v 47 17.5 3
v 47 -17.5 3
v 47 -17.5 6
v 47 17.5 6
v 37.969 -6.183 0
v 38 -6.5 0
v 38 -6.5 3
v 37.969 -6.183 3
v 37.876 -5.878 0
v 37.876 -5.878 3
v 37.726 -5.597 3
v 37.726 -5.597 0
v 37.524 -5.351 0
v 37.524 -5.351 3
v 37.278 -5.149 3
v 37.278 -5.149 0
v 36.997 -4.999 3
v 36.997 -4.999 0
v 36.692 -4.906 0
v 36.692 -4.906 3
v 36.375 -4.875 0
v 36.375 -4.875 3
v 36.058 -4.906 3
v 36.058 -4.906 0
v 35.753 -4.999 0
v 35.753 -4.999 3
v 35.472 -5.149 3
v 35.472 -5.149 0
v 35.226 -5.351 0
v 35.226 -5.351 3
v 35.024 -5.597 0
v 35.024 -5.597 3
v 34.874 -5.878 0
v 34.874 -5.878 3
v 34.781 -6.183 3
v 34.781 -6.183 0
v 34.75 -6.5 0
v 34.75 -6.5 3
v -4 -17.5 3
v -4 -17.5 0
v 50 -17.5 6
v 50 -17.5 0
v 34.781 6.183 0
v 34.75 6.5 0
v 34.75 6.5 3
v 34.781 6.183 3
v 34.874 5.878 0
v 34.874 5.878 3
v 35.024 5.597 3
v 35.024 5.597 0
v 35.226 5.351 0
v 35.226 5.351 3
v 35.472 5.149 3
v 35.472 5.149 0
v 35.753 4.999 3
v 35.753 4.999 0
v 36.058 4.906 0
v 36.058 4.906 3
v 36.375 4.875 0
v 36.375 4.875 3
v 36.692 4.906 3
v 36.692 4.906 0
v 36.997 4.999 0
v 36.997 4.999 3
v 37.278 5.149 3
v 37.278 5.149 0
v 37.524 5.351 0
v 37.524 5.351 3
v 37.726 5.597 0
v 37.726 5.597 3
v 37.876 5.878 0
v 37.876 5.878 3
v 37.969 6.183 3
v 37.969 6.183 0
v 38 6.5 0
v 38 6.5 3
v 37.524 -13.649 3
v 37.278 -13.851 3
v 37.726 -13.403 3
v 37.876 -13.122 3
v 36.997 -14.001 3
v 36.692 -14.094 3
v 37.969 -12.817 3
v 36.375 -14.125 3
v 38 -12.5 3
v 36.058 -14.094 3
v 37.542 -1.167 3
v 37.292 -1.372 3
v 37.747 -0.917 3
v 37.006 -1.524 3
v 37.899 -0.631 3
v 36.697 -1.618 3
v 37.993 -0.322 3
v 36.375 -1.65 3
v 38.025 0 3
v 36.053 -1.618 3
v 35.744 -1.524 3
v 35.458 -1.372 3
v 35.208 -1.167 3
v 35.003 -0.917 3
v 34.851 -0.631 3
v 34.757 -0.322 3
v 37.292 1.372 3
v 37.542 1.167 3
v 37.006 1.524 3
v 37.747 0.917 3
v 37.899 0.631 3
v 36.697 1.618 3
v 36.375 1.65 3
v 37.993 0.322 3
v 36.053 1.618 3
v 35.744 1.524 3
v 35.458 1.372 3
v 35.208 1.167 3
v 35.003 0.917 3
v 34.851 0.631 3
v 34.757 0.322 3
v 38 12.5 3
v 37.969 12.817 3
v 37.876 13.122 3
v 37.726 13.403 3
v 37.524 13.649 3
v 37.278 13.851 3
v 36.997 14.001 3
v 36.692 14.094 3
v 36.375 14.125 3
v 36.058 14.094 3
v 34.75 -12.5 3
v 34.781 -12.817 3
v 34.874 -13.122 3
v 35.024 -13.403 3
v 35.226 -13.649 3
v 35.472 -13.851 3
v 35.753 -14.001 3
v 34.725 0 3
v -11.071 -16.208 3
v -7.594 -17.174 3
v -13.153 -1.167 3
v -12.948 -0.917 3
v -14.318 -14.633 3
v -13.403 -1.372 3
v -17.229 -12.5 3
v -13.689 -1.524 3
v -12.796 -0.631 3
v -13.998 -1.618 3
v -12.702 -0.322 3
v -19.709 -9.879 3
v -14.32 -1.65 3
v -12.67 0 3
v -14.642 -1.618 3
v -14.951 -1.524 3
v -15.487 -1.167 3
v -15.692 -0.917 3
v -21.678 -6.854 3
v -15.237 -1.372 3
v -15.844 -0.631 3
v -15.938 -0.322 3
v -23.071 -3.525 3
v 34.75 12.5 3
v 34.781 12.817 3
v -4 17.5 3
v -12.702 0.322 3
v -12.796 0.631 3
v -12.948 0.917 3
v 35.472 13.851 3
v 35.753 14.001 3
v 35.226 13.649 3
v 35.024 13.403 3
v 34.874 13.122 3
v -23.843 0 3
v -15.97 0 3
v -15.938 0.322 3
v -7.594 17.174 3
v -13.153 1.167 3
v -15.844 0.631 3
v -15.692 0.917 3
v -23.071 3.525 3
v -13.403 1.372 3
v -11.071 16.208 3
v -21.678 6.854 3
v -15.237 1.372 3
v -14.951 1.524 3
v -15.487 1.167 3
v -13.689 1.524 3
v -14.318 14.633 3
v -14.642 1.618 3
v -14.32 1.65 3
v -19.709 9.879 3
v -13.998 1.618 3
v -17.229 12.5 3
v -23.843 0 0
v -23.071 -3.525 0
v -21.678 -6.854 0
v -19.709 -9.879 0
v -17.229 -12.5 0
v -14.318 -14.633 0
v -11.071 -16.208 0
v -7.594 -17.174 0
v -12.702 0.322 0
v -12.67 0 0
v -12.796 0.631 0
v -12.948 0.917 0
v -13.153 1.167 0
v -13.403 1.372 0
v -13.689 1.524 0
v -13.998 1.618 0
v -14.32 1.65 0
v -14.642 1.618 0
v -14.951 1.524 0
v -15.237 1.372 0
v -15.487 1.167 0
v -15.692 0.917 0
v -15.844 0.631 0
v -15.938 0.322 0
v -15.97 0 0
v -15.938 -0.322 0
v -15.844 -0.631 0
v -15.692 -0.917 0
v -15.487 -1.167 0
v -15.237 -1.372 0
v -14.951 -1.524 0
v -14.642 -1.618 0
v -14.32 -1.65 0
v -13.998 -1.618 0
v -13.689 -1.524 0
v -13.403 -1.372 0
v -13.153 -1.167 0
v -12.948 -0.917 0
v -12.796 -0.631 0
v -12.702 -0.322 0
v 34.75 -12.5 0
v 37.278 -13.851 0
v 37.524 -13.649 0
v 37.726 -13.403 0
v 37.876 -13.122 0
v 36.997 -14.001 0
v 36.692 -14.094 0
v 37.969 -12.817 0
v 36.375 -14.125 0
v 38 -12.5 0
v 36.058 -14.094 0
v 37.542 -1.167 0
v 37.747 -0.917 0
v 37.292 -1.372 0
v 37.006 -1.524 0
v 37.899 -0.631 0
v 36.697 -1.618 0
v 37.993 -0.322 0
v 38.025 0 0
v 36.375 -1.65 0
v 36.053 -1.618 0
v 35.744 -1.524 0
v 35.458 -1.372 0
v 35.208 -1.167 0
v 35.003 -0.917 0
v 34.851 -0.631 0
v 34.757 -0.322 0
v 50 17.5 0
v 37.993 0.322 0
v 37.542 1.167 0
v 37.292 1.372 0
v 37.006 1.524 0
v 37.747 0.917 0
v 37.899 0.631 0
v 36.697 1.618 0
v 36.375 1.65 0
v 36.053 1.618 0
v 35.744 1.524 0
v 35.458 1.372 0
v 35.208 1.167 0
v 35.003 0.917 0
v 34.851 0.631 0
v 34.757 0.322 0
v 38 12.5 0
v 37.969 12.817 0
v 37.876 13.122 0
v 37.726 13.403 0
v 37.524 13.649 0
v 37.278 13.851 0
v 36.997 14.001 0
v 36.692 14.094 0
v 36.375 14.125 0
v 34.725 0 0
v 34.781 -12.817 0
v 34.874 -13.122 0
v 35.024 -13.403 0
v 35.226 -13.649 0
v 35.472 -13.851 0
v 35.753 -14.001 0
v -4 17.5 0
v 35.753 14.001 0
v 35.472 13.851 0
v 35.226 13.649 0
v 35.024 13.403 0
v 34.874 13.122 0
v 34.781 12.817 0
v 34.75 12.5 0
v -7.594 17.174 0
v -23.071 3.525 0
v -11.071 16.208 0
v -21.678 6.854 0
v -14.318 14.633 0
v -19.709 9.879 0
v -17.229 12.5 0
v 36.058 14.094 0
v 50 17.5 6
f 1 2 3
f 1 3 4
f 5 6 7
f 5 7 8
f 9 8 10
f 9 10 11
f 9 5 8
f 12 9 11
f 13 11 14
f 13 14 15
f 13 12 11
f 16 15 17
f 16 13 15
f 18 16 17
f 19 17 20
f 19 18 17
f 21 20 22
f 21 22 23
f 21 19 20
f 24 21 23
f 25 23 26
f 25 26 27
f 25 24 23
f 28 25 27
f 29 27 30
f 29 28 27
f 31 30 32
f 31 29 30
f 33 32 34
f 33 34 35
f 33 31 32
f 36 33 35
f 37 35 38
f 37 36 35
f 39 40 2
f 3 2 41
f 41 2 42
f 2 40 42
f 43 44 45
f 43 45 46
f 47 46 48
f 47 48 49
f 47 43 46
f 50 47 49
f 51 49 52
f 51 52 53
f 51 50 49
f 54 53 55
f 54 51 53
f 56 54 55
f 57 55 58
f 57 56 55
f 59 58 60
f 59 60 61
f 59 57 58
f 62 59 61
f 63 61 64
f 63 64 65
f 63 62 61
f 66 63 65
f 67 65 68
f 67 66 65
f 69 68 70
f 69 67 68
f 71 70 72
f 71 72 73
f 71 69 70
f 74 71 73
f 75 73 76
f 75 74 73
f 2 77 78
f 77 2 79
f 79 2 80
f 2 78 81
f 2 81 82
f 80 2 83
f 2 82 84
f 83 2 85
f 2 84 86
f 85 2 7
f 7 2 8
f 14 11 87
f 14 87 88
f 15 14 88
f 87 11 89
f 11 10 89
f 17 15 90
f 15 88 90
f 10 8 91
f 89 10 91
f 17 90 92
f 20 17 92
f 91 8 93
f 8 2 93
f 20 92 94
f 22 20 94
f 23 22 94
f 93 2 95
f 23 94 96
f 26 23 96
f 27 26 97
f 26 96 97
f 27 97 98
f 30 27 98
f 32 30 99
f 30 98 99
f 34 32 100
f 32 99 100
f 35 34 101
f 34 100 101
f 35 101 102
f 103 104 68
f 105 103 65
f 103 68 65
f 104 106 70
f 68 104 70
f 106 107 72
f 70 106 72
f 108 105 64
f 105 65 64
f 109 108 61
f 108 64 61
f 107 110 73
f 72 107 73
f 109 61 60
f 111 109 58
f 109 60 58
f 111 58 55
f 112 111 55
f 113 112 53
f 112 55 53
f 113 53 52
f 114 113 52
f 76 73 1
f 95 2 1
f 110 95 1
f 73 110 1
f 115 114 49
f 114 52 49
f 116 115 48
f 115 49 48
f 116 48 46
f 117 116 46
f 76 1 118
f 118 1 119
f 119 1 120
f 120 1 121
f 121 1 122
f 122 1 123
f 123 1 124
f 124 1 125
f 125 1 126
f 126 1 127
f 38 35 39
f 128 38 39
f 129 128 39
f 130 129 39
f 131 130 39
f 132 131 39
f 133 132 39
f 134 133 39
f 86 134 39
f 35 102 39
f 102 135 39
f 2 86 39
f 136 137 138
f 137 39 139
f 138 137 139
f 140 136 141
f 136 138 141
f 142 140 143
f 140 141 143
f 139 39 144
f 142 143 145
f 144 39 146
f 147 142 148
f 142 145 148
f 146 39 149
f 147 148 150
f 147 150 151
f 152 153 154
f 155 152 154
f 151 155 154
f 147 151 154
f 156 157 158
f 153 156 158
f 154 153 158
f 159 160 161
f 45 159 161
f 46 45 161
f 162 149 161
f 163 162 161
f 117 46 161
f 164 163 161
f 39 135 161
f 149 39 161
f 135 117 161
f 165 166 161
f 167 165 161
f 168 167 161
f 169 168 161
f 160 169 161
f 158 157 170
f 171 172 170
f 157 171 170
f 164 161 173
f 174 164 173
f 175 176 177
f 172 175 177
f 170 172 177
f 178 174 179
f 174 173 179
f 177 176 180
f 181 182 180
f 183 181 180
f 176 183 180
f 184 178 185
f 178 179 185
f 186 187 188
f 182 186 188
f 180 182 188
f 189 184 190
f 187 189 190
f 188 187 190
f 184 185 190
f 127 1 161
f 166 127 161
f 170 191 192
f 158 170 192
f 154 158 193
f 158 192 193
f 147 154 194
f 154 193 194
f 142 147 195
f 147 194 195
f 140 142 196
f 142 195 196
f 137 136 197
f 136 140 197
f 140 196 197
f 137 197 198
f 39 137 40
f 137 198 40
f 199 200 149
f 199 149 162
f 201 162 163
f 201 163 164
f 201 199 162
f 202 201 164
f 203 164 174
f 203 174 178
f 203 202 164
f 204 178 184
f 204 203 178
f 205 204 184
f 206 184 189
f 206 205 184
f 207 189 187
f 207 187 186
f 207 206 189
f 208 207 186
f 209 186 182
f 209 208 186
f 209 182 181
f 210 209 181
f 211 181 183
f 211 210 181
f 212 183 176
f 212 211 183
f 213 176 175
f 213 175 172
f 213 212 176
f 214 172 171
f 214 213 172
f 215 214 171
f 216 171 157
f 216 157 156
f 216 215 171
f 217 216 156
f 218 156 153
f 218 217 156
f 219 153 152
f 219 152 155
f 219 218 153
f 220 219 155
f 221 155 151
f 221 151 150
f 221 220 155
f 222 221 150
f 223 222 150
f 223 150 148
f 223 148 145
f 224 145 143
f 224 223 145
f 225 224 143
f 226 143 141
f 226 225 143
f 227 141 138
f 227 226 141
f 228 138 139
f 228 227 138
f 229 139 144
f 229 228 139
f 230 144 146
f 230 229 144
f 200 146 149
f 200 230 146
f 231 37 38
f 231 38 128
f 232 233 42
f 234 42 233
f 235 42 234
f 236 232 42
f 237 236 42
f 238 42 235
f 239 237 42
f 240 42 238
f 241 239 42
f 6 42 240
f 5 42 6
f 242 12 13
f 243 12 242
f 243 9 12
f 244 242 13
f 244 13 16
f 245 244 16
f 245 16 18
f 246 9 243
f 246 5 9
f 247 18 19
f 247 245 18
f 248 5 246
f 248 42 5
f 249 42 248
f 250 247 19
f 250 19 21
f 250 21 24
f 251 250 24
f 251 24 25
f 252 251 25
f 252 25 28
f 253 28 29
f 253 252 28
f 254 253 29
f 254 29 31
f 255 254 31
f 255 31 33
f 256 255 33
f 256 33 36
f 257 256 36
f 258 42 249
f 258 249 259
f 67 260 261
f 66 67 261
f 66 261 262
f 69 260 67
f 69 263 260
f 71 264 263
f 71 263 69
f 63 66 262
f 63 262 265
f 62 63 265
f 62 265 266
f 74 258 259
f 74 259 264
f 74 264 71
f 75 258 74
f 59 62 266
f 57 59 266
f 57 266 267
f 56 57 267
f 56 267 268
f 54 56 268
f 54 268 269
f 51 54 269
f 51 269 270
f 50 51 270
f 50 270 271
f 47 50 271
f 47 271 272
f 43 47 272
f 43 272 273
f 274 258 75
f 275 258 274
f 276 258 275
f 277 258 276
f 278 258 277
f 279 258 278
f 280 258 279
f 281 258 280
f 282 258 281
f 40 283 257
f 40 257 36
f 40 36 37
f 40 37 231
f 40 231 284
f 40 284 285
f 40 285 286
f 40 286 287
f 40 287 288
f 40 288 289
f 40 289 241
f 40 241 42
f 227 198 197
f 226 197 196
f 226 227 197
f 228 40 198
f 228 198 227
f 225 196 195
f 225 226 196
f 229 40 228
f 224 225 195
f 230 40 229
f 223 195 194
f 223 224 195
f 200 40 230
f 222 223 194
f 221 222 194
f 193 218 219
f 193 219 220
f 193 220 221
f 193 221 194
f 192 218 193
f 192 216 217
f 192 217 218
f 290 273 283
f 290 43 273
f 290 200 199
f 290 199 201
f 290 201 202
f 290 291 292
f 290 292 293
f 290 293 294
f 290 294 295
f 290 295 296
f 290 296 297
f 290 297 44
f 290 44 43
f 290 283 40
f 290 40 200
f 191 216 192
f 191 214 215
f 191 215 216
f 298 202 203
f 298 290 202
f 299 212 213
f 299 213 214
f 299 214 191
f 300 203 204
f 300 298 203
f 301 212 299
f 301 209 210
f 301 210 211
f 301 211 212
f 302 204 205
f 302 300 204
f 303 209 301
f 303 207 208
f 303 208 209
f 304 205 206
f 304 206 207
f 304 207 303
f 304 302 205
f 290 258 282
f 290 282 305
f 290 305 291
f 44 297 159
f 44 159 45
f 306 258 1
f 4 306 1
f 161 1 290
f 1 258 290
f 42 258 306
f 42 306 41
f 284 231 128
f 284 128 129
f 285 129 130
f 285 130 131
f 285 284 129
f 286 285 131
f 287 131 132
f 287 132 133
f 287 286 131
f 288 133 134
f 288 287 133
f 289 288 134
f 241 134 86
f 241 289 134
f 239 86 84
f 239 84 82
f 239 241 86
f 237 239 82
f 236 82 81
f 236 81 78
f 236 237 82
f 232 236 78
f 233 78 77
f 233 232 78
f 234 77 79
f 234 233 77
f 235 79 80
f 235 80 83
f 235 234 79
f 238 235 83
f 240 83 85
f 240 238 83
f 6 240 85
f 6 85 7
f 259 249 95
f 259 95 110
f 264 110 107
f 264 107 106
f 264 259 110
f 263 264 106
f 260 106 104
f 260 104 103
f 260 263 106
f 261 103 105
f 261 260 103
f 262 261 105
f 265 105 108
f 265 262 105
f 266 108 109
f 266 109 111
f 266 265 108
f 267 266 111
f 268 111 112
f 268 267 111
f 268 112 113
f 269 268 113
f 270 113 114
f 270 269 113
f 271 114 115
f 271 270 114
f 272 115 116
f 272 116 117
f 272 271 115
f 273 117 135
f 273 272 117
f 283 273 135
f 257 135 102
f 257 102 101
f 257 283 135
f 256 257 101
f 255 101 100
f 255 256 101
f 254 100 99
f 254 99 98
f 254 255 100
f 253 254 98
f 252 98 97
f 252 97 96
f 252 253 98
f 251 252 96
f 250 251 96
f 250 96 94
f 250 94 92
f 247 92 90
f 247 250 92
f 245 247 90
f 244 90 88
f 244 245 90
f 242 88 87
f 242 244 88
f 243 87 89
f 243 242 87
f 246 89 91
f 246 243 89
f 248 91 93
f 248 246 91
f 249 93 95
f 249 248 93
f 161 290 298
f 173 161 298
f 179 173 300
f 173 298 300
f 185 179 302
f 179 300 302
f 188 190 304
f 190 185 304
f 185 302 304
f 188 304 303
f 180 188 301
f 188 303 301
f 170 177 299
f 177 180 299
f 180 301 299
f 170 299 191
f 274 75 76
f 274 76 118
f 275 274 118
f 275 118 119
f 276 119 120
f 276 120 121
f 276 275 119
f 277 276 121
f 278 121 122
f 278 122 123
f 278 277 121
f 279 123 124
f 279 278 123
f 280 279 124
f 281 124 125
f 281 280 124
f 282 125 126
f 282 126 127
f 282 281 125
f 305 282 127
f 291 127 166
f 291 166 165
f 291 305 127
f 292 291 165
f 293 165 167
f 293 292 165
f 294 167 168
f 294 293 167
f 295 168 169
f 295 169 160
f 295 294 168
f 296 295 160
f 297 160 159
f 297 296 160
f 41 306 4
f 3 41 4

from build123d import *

# Parameters (mm, degrees)
SKETCH_1_R      = 1.65
EXTRUDE_1_DEPTH = 3
FILLET_1_R      = 20
SKETCH_4_W      = 3
SKETCH_4_H      = 35
EXTRUDE_2_DEPTH = 6


with BuildPart() as part:
    # 草图1 → 凸台-拉伸1 (new body)
    with BuildSketch(Plane.XY):
        Polygon((0, 17.5), (50, 17.5), (50, -17.5), (0, -17.5), (-24, -17.5), (-24, 17.5), align=None)
        with Locations((36.375, 0)):
            Circle(SKETCH_1_R, mode=Mode.SUBTRACT)
        with Locations((-14.32, 0)):
            Circle(SKETCH_1_R, mode=Mode.SUBTRACT)
        with BuildLine():
            Line((34.75, 12.5), (34.75, 6.5))
            ThreePointArc((34.75, 6.5), (36.375, 4.875), (38, 6.5))
            Line((38, 6.5), (38, 12.5))
            ThreePointArc((38, 12.5), (36.375, 14.125), (34.75, 12.5))
        make_face(mode=Mode.SUBTRACT)
        with BuildLine():
            Line((34.75, -6.5), (34.75, -12.5))
            ThreePointArc((34.75, -12.5), (36.375, -14.125), (38, -12.5))
            Line((38, -12.5), (38, -6.5))
            ThreePointArc((38, -6.5), (36.375, -4.875), (34.75, -6.5))
        make_face(mode=Mode.SUBTRACT)
    extrude(amount=EXTRUDE_1_DEPTH)

    # 圆角1
    # the kernel refuses this fillet: 20 mm, written as the material it takes off along each edge
    with BuildSketch(Plane(origin=(-24, -17.5, -50), x_dir=(1, 0, 0), z_dir=(0, 0, 1))) as fillet_1_piece_1:
        with BuildLine():
            CenterArc((FILLET_1_R, FILLET_1_R), FILLET_1_R, 180, 90)
            Line((0, FILLET_1_R), (0, 0))
            Line((0, 0), (FILLET_1_R, 0))
        make_face()
    extrude(amount=103, mode=Mode.SUBTRACT)
    with BuildSketch(Plane(origin=(-24, 17.5, -50), x_dir=(1, 0, 0), z_dir=(0, 0, 1))) as fillet_1_piece_2:
        with BuildLine():
            CenterArc((FILLET_1_R, -FILLET_1_R), FILLET_1_R, 90, 90)
            Line((0, -FILLET_1_R), (0, 0))
            Line((0, 0), (FILLET_1_R, 0))
        make_face()
    extrude(amount=103, mode=Mode.SUBTRACT)

    # 草图4 → 凸台-拉伸2 (add)
    with BuildSketch(Plane(origin=(0, 0, 0), x_dir=(-1, 0, 0), z_dir=(0, 0, -1))):
        with Locations((-48.5, 0)):
            Rectangle(SKETCH_4_W, SKETCH_4_H)
    extrude(amount=-EXTRUDE_2_DEPTH)


solid = part.part
